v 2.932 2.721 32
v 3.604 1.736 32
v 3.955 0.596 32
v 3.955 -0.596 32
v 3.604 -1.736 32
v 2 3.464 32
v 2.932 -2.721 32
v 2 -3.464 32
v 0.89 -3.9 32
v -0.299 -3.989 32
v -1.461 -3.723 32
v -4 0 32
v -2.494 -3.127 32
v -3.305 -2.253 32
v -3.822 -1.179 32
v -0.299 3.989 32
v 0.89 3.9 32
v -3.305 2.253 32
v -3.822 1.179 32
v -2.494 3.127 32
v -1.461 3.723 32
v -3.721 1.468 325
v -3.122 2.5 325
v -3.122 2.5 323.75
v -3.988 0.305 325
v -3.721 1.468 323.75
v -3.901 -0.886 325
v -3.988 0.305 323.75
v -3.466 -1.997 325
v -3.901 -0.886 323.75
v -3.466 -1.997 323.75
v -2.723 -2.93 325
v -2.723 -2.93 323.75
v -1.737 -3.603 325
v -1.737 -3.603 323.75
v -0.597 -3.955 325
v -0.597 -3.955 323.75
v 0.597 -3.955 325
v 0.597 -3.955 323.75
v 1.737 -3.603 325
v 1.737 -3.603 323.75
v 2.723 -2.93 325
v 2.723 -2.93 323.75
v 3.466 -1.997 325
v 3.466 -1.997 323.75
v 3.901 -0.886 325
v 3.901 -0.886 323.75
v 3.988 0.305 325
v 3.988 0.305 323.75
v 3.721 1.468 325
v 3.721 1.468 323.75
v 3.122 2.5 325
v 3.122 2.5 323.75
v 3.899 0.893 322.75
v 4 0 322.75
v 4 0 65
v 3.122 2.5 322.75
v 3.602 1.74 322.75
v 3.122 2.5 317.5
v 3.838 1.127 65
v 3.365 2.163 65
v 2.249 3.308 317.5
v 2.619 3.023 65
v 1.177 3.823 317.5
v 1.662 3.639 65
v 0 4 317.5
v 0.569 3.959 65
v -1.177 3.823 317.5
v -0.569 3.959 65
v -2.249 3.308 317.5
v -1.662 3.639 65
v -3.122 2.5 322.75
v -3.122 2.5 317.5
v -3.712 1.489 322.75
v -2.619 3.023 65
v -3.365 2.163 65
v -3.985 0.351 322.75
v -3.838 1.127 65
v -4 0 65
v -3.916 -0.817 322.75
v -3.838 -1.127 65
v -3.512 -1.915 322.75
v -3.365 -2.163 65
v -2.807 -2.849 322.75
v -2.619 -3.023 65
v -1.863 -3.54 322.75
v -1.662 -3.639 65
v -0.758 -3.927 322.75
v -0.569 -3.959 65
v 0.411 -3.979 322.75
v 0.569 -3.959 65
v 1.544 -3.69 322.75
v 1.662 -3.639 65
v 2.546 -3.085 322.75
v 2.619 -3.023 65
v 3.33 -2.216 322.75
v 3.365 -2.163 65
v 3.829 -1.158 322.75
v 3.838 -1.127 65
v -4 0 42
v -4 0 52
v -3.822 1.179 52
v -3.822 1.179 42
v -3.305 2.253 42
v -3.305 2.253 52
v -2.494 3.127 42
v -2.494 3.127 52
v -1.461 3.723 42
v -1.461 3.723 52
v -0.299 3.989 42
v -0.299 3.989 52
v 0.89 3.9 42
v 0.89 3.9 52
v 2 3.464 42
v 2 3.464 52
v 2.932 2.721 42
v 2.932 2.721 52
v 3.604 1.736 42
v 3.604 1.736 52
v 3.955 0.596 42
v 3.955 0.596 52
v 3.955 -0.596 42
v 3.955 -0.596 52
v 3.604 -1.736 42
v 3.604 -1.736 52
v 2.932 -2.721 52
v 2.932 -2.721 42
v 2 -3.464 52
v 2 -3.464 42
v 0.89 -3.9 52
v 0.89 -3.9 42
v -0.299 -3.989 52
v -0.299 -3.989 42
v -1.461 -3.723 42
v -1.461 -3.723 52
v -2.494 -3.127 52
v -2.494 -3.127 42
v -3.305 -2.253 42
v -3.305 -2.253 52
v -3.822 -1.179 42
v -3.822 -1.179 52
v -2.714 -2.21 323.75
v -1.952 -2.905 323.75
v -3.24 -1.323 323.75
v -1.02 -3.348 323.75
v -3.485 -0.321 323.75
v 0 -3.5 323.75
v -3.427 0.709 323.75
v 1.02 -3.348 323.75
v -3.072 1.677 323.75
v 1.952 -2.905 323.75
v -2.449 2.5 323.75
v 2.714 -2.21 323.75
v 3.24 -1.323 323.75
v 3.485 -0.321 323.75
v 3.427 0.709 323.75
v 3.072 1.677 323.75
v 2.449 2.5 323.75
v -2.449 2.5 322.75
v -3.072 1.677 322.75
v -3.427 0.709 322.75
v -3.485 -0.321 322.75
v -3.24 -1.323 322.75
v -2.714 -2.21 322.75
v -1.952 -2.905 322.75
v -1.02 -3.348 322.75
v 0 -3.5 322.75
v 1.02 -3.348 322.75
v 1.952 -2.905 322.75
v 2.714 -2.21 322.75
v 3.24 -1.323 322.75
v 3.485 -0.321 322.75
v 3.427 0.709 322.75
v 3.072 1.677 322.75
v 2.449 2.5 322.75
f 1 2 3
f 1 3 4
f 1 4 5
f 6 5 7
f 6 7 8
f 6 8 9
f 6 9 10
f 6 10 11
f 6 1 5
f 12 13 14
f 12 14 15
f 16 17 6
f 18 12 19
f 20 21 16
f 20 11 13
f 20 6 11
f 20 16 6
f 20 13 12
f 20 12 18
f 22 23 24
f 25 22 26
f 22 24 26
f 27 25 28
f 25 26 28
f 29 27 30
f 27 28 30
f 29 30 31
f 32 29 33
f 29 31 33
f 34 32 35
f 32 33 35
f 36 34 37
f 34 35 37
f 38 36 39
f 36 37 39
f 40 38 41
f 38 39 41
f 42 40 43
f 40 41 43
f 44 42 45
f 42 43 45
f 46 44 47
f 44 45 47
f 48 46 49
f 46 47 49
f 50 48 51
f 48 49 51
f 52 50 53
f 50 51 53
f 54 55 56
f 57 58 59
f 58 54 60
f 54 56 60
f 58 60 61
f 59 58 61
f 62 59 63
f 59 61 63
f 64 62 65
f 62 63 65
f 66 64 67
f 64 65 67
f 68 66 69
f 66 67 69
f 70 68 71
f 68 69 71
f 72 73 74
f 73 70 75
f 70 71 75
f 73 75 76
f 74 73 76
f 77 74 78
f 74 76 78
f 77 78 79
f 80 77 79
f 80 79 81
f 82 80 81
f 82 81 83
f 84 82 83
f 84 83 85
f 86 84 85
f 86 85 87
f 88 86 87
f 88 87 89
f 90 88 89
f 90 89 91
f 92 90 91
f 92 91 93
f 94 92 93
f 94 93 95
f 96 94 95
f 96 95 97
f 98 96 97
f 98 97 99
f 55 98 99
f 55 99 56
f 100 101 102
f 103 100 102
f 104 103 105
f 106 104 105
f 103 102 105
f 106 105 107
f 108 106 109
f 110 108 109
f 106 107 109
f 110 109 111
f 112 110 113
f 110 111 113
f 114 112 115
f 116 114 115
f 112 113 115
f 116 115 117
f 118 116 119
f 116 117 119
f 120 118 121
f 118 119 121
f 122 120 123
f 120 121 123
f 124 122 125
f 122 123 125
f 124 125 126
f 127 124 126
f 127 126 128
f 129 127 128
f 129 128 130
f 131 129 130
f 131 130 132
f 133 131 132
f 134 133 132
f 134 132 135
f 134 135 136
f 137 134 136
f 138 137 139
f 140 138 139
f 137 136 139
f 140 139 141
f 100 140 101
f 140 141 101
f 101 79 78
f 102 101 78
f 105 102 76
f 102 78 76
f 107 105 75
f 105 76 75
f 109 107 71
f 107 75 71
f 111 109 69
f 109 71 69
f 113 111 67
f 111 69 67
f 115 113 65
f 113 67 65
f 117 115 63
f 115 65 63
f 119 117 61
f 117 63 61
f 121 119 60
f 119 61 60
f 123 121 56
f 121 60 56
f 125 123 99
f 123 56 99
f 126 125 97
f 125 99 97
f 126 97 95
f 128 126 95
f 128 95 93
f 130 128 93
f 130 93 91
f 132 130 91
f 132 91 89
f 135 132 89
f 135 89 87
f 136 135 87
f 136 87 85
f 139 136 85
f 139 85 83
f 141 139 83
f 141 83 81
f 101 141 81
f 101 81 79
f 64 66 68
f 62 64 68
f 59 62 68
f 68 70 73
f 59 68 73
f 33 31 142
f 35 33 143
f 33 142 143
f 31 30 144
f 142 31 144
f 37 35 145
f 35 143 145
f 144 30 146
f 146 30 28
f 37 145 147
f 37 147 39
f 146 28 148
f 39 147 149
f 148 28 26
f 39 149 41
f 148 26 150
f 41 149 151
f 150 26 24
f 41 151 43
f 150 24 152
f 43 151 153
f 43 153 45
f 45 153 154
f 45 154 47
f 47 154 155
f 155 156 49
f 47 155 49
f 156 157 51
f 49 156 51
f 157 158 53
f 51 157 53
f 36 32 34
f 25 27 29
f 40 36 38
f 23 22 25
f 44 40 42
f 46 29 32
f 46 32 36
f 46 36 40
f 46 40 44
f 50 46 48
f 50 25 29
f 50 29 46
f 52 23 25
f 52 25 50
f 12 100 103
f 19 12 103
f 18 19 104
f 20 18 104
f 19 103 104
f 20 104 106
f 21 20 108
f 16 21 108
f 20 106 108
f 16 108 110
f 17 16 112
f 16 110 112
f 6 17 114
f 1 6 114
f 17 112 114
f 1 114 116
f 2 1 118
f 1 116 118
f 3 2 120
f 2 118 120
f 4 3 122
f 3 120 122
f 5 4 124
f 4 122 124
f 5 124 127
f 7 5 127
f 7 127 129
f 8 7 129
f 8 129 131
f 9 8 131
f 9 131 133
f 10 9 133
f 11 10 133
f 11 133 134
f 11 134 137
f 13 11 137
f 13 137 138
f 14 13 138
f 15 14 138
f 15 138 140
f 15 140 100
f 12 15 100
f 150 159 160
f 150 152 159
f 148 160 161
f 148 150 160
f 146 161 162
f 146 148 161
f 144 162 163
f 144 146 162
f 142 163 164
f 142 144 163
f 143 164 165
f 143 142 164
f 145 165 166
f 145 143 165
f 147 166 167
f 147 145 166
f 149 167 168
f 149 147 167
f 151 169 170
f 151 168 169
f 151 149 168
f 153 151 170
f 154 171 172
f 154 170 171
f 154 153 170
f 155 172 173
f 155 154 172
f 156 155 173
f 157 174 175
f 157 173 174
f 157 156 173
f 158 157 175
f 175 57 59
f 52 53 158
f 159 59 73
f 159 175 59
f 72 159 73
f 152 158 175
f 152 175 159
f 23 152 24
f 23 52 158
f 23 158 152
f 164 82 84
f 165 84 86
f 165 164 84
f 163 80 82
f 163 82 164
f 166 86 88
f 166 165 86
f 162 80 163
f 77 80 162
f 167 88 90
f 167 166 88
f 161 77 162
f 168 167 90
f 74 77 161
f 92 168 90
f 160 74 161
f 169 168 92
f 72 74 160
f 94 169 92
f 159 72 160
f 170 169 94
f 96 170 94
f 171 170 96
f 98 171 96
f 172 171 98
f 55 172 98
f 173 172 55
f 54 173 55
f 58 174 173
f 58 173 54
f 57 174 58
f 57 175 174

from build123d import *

# Parameters (mm, degrees)
SKETCH1_R           = 4
BOSS_EXTRUDE1_DEPTH = 325
CUT_EXTRUDE1_DEPTH  = 7.5
SKETCH3_R           = 4
SKETCH3_R_2         = 3.5
CUT_EXTRUDE2_DEPTH  = 1
SKETCH5_R           = 4
CUT_EXTRUDE3_DEPTH  = 65
SKETCH6_R           = 4
BOSS_EXTRUDE2_DEPTH = 13
SKETCH7_R           = 4
BOSS_EXTRUDE3_DEPTH = 10
SKETCH8_R           = 4
BOSS_EXTRUDE4_DEPTH = 40
SKETCH9_R           = 4
CUT_EXTRUDE4_DEPTH  = 30


with BuildPart() as part:
    # Sketch1 → Boss-Extrude1 (new body)
    with BuildSketch(Plane.XY):
        Circle(SKETCH1_R)
    extrude(amount=BOSS_EXTRUDE1_DEPTH)

    # Sketch2 → Cut-Extrude1 (cut)
    with BuildSketch(Plane.XY.offset(325)):
        with BuildLine():
            Line((3.122498999, 2.5), (-3.122498999, 2.5))
            ThreePointArc((-3.122498999, 2.5), (0, 4), (3.122498999, 2.5))
        make_face()
    extrude(amount=-CUT_EXTRUDE1_DEPTH, mode=Mode.SUBTRACT)

    # Sketch3 → Cut-Extrude2 (cut)
    with BuildSketch(Plane.XY.offset(323.75)):
        Circle(SKETCH3_R)
        Circle(SKETCH3_R_2, mode=Mode.SUBTRACT)
    extrude(amount=-CUT_EXTRUDE2_DEPTH, mode=Mode.SUBTRACT)

    # Sketch5 → Cut-Extrude3 (cut)
    with BuildSketch(Plane(origin=(0, 0, 0), x_dir=(-1, 0, 0), z_dir=(0, 0, -1))):
        Circle(SKETCH5_R)
    extrude(amount=-CUT_EXTRUDE3_DEPTH, mode=Mode.SUBTRACT)

    # Sketch6 → Boss-Extrude2 (add)
    with BuildSketch(Plane(origin=(0, 0, 65), x_dir=(-1, 0, 0), z_dir=(0, 0, -1))):
        Circle(SKETCH6_R)
    extrude(amount=BOSS_EXTRUDE2_DEPTH)

    # Sketch7 → Boss-Extrude3 (add)
    with BuildSketch(Plane(origin=(0, 0, 52), x_dir=(-1, 0, 0), z_dir=(0, 0, -1))):
        Circle(SKETCH7_R)
    extrude(amount=BOSS_EXTRUDE3_DEPTH)

    # Sketch8 → Boss-Extrude4 (add)
    with BuildSketch(Plane(origin=(0, 0, 42), x_dir=(-1, 0, 0), z_dir=(0, 0, -1))):
        Circle(SKETCH8_R)
    extrude(amount=BOSS_EXTRUDE4_DEPTH)

    # Sketch9 → Cut-Extrude4 (cut)
    with BuildSketch(Plane(origin=(0, 0, 2), x_dir=(-1, 0, 0), z_dir=(0, 0, -1))):
        Circle(SKETCH9_R)
    extrude(amount=-CUT_EXTRUDE4_DEPTH, mode=Mode.SUBTRACT)


solid = part.part
